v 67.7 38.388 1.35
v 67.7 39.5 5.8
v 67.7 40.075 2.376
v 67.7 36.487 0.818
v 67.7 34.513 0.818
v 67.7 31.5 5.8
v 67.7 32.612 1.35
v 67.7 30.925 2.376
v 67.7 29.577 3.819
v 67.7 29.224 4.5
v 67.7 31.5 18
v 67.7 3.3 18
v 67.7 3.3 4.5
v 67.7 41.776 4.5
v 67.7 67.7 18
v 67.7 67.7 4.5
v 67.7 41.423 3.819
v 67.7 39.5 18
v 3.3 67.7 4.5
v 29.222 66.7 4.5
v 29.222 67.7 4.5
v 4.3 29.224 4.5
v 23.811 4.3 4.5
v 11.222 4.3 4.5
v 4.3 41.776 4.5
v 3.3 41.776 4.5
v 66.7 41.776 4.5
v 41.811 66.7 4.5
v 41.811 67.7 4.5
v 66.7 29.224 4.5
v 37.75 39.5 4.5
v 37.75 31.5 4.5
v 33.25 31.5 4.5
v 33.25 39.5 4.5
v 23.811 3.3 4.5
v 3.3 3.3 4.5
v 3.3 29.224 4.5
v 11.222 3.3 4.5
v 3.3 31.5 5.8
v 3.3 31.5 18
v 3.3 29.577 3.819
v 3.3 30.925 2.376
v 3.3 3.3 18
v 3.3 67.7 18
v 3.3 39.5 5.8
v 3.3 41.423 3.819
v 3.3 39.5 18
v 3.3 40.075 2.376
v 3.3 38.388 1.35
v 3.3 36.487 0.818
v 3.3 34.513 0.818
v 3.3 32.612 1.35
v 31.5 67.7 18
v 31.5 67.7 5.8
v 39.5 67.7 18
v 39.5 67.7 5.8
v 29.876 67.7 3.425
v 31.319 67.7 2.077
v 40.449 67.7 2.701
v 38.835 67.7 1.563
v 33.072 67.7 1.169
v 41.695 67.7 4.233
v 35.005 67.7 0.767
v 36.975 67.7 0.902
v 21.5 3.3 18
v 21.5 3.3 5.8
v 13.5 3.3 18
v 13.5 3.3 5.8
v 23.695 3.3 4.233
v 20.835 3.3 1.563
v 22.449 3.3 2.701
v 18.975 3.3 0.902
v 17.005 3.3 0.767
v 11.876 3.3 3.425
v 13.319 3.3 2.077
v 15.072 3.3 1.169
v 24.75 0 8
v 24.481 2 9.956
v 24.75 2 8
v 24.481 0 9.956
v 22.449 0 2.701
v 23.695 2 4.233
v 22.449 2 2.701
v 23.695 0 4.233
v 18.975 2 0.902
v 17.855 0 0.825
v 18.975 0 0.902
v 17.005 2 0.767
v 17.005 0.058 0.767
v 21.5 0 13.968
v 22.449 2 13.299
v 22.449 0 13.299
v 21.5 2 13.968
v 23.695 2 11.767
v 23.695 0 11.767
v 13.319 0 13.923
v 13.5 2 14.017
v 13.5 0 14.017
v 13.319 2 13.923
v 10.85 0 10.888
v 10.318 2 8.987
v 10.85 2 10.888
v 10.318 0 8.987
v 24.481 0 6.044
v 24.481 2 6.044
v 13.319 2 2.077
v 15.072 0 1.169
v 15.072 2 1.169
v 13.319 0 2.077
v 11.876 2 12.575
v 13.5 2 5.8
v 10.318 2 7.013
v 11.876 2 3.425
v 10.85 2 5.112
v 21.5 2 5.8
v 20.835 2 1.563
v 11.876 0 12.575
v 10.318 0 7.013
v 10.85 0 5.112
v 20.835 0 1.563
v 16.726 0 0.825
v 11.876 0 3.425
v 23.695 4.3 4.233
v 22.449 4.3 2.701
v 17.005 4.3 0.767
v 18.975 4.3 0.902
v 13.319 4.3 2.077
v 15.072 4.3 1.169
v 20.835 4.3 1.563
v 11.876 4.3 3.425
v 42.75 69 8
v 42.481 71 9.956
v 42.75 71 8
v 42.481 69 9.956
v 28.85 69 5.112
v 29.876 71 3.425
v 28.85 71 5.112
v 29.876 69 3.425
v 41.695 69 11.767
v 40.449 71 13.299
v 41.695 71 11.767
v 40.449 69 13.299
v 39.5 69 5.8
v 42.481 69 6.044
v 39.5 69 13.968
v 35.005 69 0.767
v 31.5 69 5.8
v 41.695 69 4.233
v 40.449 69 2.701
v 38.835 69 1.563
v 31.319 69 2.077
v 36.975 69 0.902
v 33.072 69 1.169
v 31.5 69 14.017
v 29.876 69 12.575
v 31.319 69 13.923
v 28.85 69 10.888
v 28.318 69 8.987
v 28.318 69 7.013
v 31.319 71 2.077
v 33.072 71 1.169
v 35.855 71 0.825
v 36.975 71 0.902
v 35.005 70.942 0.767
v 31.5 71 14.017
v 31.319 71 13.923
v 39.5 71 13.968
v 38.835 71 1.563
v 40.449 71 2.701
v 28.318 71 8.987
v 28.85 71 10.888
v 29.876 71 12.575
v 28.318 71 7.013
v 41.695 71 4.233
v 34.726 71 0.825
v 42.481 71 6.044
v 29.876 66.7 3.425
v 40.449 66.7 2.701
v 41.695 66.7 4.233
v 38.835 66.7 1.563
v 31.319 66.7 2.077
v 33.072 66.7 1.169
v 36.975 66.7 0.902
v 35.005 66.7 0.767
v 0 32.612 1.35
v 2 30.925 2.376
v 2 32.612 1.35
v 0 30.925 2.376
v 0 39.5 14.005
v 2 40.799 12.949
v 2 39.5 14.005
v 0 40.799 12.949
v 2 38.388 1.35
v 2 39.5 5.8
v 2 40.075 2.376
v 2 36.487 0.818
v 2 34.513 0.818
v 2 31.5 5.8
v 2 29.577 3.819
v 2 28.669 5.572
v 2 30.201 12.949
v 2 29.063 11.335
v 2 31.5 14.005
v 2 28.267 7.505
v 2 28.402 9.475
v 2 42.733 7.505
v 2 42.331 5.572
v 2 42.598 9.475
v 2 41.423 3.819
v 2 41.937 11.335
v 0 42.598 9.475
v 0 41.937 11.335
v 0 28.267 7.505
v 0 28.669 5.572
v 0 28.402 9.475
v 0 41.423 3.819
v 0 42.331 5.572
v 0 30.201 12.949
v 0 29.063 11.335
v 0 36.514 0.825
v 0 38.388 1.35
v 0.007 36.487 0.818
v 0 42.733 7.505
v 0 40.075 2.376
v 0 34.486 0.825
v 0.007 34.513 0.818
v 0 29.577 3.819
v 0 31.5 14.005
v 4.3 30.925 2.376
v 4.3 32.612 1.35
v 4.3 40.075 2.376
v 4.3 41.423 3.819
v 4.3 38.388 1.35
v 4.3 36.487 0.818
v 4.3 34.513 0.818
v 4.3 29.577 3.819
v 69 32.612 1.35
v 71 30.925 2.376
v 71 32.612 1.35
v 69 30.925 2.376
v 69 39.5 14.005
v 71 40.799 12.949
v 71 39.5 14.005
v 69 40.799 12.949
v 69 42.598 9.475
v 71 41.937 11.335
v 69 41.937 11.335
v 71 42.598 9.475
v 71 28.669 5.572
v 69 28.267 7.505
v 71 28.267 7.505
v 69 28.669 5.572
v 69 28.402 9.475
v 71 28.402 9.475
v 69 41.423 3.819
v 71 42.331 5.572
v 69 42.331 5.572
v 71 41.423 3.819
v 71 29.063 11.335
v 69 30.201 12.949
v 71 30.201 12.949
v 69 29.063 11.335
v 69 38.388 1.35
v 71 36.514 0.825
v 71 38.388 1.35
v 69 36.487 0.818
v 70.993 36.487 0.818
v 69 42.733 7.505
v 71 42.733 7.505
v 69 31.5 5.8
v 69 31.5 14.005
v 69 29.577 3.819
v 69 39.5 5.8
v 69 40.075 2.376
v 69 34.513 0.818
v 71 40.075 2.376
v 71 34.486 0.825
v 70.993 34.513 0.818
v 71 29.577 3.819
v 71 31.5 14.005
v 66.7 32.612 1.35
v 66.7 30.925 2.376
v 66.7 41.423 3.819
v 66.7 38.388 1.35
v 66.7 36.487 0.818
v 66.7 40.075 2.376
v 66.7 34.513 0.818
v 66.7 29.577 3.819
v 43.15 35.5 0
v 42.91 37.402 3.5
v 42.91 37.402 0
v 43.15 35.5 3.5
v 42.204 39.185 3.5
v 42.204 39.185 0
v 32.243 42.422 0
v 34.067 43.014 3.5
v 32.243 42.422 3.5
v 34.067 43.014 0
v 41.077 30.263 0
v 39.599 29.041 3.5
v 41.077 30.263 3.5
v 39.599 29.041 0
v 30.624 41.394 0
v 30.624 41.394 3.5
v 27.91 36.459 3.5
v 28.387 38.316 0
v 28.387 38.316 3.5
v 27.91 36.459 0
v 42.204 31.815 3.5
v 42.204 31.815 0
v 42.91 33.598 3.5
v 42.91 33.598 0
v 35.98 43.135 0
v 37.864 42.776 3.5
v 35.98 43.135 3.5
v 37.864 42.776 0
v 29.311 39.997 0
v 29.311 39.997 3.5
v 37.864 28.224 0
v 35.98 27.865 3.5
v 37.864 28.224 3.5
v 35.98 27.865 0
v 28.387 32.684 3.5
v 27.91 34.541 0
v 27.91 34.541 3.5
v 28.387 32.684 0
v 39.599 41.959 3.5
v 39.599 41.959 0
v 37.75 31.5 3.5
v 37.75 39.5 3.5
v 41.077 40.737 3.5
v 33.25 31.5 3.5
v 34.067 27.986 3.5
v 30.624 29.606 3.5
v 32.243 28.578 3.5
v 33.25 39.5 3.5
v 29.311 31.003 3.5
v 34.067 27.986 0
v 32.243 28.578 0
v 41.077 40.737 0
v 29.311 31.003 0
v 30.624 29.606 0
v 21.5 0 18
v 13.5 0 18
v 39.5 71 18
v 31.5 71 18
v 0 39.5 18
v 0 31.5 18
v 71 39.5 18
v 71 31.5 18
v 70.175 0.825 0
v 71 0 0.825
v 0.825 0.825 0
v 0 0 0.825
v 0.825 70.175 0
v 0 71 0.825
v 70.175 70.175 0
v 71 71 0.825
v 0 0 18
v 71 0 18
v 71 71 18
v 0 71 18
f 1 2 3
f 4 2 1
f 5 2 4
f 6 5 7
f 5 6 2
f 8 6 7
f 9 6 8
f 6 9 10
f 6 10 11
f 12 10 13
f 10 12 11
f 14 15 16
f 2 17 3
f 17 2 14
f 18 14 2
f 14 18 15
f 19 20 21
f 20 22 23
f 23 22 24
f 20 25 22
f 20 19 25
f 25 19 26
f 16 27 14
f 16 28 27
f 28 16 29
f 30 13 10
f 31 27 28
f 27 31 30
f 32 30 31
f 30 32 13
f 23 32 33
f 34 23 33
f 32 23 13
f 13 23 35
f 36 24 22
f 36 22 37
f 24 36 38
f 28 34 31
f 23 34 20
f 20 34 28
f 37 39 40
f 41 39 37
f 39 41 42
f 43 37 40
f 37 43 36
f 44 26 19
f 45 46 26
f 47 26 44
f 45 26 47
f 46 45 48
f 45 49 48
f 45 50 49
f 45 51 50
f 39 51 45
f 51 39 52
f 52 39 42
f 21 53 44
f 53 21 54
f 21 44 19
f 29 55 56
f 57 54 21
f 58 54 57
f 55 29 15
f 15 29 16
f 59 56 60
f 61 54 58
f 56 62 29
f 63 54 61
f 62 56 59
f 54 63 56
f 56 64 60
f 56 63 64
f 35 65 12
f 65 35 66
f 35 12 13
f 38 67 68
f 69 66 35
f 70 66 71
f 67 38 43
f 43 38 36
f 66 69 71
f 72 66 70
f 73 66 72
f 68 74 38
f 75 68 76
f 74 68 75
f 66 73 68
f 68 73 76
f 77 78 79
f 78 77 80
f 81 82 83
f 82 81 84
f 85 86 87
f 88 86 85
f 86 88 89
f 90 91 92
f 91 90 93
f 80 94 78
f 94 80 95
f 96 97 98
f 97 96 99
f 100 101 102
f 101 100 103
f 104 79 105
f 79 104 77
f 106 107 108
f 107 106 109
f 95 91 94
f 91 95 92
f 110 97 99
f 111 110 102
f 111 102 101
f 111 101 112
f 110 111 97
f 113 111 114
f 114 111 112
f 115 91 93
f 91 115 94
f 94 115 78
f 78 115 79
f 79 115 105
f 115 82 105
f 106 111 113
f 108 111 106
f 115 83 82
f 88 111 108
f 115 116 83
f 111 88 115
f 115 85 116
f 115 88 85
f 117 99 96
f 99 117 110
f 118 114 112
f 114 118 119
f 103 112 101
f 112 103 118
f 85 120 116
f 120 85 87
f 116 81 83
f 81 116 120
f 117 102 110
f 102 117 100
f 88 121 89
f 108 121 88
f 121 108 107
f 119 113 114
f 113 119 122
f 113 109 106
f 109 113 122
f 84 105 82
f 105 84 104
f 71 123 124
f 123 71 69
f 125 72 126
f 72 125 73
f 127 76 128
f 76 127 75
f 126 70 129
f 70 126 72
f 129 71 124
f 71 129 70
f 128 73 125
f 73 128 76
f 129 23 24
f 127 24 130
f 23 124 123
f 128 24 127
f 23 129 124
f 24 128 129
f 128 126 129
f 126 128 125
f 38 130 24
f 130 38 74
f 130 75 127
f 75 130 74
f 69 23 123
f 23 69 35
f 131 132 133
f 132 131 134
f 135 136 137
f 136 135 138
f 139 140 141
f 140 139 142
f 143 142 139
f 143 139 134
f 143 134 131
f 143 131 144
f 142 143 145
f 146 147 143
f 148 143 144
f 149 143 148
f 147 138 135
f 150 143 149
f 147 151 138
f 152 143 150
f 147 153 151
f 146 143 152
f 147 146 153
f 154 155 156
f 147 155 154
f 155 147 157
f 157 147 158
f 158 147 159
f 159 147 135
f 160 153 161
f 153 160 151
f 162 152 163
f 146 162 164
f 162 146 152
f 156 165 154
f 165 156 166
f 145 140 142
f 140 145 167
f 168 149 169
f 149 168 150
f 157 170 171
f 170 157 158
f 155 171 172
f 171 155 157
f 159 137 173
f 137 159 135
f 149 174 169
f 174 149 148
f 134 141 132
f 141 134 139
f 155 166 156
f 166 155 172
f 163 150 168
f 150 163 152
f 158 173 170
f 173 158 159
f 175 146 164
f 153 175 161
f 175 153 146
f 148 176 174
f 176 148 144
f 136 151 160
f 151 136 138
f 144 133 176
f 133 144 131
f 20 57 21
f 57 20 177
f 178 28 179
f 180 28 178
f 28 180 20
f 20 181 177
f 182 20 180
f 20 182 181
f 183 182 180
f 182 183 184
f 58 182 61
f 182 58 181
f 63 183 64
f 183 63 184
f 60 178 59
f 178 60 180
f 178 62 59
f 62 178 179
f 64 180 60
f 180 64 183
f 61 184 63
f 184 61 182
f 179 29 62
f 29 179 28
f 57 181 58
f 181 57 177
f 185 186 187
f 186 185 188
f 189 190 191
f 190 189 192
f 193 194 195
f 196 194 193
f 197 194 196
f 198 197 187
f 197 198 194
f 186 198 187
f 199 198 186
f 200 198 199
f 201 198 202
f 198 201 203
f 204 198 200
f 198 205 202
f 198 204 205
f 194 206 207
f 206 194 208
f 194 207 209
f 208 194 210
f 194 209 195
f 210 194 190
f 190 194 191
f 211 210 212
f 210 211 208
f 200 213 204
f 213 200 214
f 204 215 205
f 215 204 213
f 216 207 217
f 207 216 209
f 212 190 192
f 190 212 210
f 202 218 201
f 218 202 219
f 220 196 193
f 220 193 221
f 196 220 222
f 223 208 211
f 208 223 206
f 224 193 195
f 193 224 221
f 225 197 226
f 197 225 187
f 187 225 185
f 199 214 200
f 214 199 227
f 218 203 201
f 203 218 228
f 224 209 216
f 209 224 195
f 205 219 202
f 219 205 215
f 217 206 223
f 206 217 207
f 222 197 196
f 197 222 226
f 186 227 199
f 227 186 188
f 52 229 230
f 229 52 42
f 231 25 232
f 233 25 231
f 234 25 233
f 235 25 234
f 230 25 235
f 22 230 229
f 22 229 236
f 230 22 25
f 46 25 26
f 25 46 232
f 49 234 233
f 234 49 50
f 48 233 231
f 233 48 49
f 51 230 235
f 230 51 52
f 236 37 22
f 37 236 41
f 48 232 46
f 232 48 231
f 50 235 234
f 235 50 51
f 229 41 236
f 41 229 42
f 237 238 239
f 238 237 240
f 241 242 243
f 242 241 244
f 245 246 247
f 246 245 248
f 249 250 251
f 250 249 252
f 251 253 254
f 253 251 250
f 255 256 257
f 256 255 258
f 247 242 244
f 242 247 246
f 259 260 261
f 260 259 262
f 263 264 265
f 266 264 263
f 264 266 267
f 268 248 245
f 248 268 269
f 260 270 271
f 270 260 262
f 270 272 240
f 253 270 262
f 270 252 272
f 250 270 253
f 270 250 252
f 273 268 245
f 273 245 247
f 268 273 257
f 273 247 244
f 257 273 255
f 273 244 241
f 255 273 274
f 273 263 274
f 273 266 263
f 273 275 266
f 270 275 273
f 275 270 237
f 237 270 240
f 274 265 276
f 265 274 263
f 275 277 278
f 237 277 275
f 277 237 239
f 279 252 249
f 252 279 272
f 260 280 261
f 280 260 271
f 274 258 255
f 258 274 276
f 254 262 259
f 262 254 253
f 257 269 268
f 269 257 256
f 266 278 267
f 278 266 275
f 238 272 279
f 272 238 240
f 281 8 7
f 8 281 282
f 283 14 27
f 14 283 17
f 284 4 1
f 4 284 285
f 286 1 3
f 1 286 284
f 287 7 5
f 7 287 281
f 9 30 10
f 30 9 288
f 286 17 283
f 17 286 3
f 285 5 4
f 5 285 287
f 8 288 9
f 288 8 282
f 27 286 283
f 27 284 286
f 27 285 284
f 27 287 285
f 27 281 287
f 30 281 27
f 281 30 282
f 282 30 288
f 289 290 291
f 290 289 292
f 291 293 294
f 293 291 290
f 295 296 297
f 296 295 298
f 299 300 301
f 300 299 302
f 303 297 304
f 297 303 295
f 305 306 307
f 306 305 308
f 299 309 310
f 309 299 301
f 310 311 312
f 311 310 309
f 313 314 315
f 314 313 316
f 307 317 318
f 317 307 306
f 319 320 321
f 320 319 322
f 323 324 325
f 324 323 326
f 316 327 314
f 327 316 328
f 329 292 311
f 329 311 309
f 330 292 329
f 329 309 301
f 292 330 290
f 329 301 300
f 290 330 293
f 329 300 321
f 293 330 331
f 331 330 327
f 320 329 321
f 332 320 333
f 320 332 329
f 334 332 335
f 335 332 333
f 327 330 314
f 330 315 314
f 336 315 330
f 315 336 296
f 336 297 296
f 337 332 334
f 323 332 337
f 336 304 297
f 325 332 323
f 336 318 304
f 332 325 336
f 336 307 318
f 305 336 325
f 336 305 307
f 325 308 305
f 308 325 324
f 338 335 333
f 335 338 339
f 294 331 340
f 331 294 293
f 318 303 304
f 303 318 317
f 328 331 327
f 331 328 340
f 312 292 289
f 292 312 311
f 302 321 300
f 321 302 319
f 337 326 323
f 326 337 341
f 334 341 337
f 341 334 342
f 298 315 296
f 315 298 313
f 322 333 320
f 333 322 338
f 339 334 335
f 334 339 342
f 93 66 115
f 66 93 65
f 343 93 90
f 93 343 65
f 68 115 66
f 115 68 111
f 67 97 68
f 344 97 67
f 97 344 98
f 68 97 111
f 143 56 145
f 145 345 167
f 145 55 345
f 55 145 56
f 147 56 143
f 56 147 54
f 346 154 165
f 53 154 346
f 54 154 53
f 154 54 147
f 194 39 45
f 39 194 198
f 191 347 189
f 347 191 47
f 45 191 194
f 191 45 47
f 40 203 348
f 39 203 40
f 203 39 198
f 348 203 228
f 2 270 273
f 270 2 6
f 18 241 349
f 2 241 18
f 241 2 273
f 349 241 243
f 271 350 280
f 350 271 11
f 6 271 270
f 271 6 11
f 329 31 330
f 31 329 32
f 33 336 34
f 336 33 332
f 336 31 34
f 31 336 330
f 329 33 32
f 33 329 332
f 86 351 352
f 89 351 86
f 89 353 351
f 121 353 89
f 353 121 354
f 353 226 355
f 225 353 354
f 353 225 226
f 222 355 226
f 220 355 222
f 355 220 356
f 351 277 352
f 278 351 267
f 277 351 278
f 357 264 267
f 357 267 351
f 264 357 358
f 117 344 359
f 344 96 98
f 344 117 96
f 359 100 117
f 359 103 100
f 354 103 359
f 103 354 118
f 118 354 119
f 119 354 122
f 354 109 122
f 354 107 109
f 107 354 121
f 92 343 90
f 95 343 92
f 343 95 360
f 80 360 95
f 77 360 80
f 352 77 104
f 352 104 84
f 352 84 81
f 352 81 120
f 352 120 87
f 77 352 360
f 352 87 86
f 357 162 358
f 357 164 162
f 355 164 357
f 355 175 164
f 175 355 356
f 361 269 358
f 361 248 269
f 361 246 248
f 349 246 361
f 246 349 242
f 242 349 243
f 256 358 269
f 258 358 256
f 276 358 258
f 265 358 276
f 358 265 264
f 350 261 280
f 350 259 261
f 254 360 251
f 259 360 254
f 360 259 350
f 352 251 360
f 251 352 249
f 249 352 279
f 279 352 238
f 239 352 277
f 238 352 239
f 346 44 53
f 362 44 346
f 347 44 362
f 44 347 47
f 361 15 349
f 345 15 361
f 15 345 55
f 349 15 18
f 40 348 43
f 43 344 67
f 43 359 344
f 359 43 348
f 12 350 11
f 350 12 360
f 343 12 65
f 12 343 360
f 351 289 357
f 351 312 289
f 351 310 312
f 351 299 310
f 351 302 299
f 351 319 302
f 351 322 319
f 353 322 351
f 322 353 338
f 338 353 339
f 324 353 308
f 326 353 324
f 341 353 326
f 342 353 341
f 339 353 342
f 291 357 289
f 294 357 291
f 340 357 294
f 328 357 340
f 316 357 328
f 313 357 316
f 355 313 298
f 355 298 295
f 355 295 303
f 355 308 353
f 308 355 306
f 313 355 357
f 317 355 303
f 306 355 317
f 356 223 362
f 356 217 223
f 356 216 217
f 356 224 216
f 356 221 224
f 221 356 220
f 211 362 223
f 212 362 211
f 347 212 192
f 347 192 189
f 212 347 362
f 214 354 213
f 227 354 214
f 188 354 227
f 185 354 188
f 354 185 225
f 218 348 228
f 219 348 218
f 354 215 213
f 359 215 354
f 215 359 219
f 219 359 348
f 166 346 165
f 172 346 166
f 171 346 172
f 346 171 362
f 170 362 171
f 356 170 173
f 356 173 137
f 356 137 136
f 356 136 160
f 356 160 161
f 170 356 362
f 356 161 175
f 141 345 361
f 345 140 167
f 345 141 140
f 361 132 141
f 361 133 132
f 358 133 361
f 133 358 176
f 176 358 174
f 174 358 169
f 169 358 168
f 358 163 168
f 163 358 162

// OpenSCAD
module cap_1x1(width, height, thickness)
{
    width1=width-thickness;
    difference()
    {
        union()
        {
            cube([width, width, thickness*3/4]);
            translate([thickness,thickness,0])cube([width-2*thickness, width-2*thickness, height]);
        }
        translate([width/2,width/2,0])rotate([0,0,45])translate([-width1/2,-width1/2,thickness*3/4]) cube([width1,width1,height]);
    }
}

module radio_cube_1x1(width, height, thickness)
{
    difference()
    {
        cube([width,width,height]);
        union()
        {
            translate([thickness,thickness,thickness+1.2]) cube([width-2*thickness,width-2*thickness,height+10]);
            
            //-y
            translate([width/2,2.0,8])rotate([90,0,0])cylinder(r=14.5/2, h=2.6);
            translate([width/2,thickness+1,8])rotate([90,0,0])cylinder(r=14.5/2, h=1);
            
            // y
            translate([width/2,width+0.6,8])rotate([90,0,0])cylinder(r=14.5/2, h=2.6);
            translate([width/2,width-thickness,8])rotate([90,0,0])cylinder(r=14.5/2, h=1);
            
            //-x
            translate([2.0,width/2,8])rotate([0,-90,0])cylinder(r=14.5/2, h=2.6);
            translate([thickness+1,width/2,8])rotate([0,-90,0])cylinder(r=14.5/2, h=1);
            
            // x
            translate([width+0.6,width/2,8])rotate([0,-90,0])cylinder(r=14.5/2, h=2.6);
            translate([width-thickness,width/2,8])rotate([0,-90,0])cylinder(r=14.5/2, h=1);

            //bottom
            translate([width/2,width/2,-0.1]) cylinder(r=15.3/2, h=3.6);
            
            //cutouts
            // -y
            translate([width/2-4,-0.2,5.8])cube([8,20,15]);
            // y
            translate([width/2-4, width-10,5.8])cube([8,20,15]);
            // -x
            translate([-0.2,width/2-4,5.8])cube([20,8,15]);
            // x
            translate([width-10,width/2-4,5.8])cube([20,8,15]);
            // bottom
            translate([width/2-2.25,width/2-4,0])cube([4.5,8,15]);
            
            //corners
            translate([0,0.25*thickness,0])rotate([45,0,0]) translate([-0.5*width, -width, -0.5*height]) cube([2*width, width, 2*height]);
            translate([0.25*thickness,0,0]) rotate([0,-45,0]) translate([-width, -0.5*width, -0.5*height]) cube([width, 2*width, 2*height]);
            translate([width-0.25*thickness,0,0]) rotate([0,45,0]) translate([0, 0, -0.5*height]) cube([width, 2*width, 2*height]);
            translate([0,width-0.25*thickness,0]) rotate([-45,0,0]) translate([-0.5*width, 0, -0.5*height]) cube([2*width, width, 2*height]);
        }
    }
}

module radio_cube_2x2(width, height, thickness)
{
    width2 = width;
    width = 2*width + 1;
    difference()
    {
        cube([width,width,height]);
        union()
        {
            translate([thickness,thickness,thickness+1.2]) cube([width-2*thickness,width-2*thickness,height+10]);
            
            //-y
            translate([width2/2,2.0,8])rotate([90,0,0])cylinder(r=14.5/2, h=2.6);
            translate([width2/2,thickness+1,8])rotate([90,0,0])cylinder(r=14.5/2, h=1);
            
            // y
            translate([width/2,width+0.6,8])rotate([90,0,0])cylinder(r=14.5/2, h=2.6);
            translate([width/2,width-thickness,8])rotate([90,0,0])cylinder(r=14.5/2, h=1);
            
            //-x
            translate([2.0,width/2,8])rotate([0,-90,0])cylinder(r=14.5/2, h=2.6);
            translate([thickness+1,width/2,8])rotate([0,-90,0])cylinder(r=14.5/2, h=1);
            
            // x
            translate([width+0.6,width/2,8])rotate([0,-90,0])cylinder(r=14.5/2, h=2.6);
            translate([width-thickness,width/2,8])rotate([0,-90,0])cylinder(r=14.5/2, h=1);

            //bottom
            translate([width/2,width/2,-0.1]) cylinder(r=15.3/2, h=3.6);
            
            //cutouts
            // -y
            translate([width2/2-4,-0.2,5.8])cube([8,20,15]);
            // y
            translate([width/2-4, width-10,5.8])cube([8,20,15]);
            // -x
            translate([-0.2,width/2-4,5.8])cube([20,8,15]);
            // x
            translate([width-10,width/2-4,5.8])cube([20,8,15]);
            // bottom
            translate([width/2-2.25,width/2-4,0])cube([4.5,8,15]);
            
            //corners
            translate([0,0.25*thickness,0])rotate([45,0,0]) translate([-0.5*width, -width, -0.5*height]) cube([2*width, width, 2*height]);
            translate([0.25*thickness,0,0]) rotate([0,-45,0]) translate([-width, -0.5*width, -0.5*height]) cube([width, 2*width, 2*height]);
            translate([width-0.25*thickness,0,0]) rotate([0,45,0]) translate([0, 0, -0.5*height]) cube([width, 2*width, 2*height]);
            translate([0,width-0.25*thickness,0]) rotate([-45,0,0]) translate([-0.5*width, 0, -0.5*height]) cube([2*width, width, 2*height]);
        }
    }
}

//radio_cube_1x1(35,18,3.3);
radio_cube_2x2(35,18,3.3);
//cap_1x1(30,6,3.3);
